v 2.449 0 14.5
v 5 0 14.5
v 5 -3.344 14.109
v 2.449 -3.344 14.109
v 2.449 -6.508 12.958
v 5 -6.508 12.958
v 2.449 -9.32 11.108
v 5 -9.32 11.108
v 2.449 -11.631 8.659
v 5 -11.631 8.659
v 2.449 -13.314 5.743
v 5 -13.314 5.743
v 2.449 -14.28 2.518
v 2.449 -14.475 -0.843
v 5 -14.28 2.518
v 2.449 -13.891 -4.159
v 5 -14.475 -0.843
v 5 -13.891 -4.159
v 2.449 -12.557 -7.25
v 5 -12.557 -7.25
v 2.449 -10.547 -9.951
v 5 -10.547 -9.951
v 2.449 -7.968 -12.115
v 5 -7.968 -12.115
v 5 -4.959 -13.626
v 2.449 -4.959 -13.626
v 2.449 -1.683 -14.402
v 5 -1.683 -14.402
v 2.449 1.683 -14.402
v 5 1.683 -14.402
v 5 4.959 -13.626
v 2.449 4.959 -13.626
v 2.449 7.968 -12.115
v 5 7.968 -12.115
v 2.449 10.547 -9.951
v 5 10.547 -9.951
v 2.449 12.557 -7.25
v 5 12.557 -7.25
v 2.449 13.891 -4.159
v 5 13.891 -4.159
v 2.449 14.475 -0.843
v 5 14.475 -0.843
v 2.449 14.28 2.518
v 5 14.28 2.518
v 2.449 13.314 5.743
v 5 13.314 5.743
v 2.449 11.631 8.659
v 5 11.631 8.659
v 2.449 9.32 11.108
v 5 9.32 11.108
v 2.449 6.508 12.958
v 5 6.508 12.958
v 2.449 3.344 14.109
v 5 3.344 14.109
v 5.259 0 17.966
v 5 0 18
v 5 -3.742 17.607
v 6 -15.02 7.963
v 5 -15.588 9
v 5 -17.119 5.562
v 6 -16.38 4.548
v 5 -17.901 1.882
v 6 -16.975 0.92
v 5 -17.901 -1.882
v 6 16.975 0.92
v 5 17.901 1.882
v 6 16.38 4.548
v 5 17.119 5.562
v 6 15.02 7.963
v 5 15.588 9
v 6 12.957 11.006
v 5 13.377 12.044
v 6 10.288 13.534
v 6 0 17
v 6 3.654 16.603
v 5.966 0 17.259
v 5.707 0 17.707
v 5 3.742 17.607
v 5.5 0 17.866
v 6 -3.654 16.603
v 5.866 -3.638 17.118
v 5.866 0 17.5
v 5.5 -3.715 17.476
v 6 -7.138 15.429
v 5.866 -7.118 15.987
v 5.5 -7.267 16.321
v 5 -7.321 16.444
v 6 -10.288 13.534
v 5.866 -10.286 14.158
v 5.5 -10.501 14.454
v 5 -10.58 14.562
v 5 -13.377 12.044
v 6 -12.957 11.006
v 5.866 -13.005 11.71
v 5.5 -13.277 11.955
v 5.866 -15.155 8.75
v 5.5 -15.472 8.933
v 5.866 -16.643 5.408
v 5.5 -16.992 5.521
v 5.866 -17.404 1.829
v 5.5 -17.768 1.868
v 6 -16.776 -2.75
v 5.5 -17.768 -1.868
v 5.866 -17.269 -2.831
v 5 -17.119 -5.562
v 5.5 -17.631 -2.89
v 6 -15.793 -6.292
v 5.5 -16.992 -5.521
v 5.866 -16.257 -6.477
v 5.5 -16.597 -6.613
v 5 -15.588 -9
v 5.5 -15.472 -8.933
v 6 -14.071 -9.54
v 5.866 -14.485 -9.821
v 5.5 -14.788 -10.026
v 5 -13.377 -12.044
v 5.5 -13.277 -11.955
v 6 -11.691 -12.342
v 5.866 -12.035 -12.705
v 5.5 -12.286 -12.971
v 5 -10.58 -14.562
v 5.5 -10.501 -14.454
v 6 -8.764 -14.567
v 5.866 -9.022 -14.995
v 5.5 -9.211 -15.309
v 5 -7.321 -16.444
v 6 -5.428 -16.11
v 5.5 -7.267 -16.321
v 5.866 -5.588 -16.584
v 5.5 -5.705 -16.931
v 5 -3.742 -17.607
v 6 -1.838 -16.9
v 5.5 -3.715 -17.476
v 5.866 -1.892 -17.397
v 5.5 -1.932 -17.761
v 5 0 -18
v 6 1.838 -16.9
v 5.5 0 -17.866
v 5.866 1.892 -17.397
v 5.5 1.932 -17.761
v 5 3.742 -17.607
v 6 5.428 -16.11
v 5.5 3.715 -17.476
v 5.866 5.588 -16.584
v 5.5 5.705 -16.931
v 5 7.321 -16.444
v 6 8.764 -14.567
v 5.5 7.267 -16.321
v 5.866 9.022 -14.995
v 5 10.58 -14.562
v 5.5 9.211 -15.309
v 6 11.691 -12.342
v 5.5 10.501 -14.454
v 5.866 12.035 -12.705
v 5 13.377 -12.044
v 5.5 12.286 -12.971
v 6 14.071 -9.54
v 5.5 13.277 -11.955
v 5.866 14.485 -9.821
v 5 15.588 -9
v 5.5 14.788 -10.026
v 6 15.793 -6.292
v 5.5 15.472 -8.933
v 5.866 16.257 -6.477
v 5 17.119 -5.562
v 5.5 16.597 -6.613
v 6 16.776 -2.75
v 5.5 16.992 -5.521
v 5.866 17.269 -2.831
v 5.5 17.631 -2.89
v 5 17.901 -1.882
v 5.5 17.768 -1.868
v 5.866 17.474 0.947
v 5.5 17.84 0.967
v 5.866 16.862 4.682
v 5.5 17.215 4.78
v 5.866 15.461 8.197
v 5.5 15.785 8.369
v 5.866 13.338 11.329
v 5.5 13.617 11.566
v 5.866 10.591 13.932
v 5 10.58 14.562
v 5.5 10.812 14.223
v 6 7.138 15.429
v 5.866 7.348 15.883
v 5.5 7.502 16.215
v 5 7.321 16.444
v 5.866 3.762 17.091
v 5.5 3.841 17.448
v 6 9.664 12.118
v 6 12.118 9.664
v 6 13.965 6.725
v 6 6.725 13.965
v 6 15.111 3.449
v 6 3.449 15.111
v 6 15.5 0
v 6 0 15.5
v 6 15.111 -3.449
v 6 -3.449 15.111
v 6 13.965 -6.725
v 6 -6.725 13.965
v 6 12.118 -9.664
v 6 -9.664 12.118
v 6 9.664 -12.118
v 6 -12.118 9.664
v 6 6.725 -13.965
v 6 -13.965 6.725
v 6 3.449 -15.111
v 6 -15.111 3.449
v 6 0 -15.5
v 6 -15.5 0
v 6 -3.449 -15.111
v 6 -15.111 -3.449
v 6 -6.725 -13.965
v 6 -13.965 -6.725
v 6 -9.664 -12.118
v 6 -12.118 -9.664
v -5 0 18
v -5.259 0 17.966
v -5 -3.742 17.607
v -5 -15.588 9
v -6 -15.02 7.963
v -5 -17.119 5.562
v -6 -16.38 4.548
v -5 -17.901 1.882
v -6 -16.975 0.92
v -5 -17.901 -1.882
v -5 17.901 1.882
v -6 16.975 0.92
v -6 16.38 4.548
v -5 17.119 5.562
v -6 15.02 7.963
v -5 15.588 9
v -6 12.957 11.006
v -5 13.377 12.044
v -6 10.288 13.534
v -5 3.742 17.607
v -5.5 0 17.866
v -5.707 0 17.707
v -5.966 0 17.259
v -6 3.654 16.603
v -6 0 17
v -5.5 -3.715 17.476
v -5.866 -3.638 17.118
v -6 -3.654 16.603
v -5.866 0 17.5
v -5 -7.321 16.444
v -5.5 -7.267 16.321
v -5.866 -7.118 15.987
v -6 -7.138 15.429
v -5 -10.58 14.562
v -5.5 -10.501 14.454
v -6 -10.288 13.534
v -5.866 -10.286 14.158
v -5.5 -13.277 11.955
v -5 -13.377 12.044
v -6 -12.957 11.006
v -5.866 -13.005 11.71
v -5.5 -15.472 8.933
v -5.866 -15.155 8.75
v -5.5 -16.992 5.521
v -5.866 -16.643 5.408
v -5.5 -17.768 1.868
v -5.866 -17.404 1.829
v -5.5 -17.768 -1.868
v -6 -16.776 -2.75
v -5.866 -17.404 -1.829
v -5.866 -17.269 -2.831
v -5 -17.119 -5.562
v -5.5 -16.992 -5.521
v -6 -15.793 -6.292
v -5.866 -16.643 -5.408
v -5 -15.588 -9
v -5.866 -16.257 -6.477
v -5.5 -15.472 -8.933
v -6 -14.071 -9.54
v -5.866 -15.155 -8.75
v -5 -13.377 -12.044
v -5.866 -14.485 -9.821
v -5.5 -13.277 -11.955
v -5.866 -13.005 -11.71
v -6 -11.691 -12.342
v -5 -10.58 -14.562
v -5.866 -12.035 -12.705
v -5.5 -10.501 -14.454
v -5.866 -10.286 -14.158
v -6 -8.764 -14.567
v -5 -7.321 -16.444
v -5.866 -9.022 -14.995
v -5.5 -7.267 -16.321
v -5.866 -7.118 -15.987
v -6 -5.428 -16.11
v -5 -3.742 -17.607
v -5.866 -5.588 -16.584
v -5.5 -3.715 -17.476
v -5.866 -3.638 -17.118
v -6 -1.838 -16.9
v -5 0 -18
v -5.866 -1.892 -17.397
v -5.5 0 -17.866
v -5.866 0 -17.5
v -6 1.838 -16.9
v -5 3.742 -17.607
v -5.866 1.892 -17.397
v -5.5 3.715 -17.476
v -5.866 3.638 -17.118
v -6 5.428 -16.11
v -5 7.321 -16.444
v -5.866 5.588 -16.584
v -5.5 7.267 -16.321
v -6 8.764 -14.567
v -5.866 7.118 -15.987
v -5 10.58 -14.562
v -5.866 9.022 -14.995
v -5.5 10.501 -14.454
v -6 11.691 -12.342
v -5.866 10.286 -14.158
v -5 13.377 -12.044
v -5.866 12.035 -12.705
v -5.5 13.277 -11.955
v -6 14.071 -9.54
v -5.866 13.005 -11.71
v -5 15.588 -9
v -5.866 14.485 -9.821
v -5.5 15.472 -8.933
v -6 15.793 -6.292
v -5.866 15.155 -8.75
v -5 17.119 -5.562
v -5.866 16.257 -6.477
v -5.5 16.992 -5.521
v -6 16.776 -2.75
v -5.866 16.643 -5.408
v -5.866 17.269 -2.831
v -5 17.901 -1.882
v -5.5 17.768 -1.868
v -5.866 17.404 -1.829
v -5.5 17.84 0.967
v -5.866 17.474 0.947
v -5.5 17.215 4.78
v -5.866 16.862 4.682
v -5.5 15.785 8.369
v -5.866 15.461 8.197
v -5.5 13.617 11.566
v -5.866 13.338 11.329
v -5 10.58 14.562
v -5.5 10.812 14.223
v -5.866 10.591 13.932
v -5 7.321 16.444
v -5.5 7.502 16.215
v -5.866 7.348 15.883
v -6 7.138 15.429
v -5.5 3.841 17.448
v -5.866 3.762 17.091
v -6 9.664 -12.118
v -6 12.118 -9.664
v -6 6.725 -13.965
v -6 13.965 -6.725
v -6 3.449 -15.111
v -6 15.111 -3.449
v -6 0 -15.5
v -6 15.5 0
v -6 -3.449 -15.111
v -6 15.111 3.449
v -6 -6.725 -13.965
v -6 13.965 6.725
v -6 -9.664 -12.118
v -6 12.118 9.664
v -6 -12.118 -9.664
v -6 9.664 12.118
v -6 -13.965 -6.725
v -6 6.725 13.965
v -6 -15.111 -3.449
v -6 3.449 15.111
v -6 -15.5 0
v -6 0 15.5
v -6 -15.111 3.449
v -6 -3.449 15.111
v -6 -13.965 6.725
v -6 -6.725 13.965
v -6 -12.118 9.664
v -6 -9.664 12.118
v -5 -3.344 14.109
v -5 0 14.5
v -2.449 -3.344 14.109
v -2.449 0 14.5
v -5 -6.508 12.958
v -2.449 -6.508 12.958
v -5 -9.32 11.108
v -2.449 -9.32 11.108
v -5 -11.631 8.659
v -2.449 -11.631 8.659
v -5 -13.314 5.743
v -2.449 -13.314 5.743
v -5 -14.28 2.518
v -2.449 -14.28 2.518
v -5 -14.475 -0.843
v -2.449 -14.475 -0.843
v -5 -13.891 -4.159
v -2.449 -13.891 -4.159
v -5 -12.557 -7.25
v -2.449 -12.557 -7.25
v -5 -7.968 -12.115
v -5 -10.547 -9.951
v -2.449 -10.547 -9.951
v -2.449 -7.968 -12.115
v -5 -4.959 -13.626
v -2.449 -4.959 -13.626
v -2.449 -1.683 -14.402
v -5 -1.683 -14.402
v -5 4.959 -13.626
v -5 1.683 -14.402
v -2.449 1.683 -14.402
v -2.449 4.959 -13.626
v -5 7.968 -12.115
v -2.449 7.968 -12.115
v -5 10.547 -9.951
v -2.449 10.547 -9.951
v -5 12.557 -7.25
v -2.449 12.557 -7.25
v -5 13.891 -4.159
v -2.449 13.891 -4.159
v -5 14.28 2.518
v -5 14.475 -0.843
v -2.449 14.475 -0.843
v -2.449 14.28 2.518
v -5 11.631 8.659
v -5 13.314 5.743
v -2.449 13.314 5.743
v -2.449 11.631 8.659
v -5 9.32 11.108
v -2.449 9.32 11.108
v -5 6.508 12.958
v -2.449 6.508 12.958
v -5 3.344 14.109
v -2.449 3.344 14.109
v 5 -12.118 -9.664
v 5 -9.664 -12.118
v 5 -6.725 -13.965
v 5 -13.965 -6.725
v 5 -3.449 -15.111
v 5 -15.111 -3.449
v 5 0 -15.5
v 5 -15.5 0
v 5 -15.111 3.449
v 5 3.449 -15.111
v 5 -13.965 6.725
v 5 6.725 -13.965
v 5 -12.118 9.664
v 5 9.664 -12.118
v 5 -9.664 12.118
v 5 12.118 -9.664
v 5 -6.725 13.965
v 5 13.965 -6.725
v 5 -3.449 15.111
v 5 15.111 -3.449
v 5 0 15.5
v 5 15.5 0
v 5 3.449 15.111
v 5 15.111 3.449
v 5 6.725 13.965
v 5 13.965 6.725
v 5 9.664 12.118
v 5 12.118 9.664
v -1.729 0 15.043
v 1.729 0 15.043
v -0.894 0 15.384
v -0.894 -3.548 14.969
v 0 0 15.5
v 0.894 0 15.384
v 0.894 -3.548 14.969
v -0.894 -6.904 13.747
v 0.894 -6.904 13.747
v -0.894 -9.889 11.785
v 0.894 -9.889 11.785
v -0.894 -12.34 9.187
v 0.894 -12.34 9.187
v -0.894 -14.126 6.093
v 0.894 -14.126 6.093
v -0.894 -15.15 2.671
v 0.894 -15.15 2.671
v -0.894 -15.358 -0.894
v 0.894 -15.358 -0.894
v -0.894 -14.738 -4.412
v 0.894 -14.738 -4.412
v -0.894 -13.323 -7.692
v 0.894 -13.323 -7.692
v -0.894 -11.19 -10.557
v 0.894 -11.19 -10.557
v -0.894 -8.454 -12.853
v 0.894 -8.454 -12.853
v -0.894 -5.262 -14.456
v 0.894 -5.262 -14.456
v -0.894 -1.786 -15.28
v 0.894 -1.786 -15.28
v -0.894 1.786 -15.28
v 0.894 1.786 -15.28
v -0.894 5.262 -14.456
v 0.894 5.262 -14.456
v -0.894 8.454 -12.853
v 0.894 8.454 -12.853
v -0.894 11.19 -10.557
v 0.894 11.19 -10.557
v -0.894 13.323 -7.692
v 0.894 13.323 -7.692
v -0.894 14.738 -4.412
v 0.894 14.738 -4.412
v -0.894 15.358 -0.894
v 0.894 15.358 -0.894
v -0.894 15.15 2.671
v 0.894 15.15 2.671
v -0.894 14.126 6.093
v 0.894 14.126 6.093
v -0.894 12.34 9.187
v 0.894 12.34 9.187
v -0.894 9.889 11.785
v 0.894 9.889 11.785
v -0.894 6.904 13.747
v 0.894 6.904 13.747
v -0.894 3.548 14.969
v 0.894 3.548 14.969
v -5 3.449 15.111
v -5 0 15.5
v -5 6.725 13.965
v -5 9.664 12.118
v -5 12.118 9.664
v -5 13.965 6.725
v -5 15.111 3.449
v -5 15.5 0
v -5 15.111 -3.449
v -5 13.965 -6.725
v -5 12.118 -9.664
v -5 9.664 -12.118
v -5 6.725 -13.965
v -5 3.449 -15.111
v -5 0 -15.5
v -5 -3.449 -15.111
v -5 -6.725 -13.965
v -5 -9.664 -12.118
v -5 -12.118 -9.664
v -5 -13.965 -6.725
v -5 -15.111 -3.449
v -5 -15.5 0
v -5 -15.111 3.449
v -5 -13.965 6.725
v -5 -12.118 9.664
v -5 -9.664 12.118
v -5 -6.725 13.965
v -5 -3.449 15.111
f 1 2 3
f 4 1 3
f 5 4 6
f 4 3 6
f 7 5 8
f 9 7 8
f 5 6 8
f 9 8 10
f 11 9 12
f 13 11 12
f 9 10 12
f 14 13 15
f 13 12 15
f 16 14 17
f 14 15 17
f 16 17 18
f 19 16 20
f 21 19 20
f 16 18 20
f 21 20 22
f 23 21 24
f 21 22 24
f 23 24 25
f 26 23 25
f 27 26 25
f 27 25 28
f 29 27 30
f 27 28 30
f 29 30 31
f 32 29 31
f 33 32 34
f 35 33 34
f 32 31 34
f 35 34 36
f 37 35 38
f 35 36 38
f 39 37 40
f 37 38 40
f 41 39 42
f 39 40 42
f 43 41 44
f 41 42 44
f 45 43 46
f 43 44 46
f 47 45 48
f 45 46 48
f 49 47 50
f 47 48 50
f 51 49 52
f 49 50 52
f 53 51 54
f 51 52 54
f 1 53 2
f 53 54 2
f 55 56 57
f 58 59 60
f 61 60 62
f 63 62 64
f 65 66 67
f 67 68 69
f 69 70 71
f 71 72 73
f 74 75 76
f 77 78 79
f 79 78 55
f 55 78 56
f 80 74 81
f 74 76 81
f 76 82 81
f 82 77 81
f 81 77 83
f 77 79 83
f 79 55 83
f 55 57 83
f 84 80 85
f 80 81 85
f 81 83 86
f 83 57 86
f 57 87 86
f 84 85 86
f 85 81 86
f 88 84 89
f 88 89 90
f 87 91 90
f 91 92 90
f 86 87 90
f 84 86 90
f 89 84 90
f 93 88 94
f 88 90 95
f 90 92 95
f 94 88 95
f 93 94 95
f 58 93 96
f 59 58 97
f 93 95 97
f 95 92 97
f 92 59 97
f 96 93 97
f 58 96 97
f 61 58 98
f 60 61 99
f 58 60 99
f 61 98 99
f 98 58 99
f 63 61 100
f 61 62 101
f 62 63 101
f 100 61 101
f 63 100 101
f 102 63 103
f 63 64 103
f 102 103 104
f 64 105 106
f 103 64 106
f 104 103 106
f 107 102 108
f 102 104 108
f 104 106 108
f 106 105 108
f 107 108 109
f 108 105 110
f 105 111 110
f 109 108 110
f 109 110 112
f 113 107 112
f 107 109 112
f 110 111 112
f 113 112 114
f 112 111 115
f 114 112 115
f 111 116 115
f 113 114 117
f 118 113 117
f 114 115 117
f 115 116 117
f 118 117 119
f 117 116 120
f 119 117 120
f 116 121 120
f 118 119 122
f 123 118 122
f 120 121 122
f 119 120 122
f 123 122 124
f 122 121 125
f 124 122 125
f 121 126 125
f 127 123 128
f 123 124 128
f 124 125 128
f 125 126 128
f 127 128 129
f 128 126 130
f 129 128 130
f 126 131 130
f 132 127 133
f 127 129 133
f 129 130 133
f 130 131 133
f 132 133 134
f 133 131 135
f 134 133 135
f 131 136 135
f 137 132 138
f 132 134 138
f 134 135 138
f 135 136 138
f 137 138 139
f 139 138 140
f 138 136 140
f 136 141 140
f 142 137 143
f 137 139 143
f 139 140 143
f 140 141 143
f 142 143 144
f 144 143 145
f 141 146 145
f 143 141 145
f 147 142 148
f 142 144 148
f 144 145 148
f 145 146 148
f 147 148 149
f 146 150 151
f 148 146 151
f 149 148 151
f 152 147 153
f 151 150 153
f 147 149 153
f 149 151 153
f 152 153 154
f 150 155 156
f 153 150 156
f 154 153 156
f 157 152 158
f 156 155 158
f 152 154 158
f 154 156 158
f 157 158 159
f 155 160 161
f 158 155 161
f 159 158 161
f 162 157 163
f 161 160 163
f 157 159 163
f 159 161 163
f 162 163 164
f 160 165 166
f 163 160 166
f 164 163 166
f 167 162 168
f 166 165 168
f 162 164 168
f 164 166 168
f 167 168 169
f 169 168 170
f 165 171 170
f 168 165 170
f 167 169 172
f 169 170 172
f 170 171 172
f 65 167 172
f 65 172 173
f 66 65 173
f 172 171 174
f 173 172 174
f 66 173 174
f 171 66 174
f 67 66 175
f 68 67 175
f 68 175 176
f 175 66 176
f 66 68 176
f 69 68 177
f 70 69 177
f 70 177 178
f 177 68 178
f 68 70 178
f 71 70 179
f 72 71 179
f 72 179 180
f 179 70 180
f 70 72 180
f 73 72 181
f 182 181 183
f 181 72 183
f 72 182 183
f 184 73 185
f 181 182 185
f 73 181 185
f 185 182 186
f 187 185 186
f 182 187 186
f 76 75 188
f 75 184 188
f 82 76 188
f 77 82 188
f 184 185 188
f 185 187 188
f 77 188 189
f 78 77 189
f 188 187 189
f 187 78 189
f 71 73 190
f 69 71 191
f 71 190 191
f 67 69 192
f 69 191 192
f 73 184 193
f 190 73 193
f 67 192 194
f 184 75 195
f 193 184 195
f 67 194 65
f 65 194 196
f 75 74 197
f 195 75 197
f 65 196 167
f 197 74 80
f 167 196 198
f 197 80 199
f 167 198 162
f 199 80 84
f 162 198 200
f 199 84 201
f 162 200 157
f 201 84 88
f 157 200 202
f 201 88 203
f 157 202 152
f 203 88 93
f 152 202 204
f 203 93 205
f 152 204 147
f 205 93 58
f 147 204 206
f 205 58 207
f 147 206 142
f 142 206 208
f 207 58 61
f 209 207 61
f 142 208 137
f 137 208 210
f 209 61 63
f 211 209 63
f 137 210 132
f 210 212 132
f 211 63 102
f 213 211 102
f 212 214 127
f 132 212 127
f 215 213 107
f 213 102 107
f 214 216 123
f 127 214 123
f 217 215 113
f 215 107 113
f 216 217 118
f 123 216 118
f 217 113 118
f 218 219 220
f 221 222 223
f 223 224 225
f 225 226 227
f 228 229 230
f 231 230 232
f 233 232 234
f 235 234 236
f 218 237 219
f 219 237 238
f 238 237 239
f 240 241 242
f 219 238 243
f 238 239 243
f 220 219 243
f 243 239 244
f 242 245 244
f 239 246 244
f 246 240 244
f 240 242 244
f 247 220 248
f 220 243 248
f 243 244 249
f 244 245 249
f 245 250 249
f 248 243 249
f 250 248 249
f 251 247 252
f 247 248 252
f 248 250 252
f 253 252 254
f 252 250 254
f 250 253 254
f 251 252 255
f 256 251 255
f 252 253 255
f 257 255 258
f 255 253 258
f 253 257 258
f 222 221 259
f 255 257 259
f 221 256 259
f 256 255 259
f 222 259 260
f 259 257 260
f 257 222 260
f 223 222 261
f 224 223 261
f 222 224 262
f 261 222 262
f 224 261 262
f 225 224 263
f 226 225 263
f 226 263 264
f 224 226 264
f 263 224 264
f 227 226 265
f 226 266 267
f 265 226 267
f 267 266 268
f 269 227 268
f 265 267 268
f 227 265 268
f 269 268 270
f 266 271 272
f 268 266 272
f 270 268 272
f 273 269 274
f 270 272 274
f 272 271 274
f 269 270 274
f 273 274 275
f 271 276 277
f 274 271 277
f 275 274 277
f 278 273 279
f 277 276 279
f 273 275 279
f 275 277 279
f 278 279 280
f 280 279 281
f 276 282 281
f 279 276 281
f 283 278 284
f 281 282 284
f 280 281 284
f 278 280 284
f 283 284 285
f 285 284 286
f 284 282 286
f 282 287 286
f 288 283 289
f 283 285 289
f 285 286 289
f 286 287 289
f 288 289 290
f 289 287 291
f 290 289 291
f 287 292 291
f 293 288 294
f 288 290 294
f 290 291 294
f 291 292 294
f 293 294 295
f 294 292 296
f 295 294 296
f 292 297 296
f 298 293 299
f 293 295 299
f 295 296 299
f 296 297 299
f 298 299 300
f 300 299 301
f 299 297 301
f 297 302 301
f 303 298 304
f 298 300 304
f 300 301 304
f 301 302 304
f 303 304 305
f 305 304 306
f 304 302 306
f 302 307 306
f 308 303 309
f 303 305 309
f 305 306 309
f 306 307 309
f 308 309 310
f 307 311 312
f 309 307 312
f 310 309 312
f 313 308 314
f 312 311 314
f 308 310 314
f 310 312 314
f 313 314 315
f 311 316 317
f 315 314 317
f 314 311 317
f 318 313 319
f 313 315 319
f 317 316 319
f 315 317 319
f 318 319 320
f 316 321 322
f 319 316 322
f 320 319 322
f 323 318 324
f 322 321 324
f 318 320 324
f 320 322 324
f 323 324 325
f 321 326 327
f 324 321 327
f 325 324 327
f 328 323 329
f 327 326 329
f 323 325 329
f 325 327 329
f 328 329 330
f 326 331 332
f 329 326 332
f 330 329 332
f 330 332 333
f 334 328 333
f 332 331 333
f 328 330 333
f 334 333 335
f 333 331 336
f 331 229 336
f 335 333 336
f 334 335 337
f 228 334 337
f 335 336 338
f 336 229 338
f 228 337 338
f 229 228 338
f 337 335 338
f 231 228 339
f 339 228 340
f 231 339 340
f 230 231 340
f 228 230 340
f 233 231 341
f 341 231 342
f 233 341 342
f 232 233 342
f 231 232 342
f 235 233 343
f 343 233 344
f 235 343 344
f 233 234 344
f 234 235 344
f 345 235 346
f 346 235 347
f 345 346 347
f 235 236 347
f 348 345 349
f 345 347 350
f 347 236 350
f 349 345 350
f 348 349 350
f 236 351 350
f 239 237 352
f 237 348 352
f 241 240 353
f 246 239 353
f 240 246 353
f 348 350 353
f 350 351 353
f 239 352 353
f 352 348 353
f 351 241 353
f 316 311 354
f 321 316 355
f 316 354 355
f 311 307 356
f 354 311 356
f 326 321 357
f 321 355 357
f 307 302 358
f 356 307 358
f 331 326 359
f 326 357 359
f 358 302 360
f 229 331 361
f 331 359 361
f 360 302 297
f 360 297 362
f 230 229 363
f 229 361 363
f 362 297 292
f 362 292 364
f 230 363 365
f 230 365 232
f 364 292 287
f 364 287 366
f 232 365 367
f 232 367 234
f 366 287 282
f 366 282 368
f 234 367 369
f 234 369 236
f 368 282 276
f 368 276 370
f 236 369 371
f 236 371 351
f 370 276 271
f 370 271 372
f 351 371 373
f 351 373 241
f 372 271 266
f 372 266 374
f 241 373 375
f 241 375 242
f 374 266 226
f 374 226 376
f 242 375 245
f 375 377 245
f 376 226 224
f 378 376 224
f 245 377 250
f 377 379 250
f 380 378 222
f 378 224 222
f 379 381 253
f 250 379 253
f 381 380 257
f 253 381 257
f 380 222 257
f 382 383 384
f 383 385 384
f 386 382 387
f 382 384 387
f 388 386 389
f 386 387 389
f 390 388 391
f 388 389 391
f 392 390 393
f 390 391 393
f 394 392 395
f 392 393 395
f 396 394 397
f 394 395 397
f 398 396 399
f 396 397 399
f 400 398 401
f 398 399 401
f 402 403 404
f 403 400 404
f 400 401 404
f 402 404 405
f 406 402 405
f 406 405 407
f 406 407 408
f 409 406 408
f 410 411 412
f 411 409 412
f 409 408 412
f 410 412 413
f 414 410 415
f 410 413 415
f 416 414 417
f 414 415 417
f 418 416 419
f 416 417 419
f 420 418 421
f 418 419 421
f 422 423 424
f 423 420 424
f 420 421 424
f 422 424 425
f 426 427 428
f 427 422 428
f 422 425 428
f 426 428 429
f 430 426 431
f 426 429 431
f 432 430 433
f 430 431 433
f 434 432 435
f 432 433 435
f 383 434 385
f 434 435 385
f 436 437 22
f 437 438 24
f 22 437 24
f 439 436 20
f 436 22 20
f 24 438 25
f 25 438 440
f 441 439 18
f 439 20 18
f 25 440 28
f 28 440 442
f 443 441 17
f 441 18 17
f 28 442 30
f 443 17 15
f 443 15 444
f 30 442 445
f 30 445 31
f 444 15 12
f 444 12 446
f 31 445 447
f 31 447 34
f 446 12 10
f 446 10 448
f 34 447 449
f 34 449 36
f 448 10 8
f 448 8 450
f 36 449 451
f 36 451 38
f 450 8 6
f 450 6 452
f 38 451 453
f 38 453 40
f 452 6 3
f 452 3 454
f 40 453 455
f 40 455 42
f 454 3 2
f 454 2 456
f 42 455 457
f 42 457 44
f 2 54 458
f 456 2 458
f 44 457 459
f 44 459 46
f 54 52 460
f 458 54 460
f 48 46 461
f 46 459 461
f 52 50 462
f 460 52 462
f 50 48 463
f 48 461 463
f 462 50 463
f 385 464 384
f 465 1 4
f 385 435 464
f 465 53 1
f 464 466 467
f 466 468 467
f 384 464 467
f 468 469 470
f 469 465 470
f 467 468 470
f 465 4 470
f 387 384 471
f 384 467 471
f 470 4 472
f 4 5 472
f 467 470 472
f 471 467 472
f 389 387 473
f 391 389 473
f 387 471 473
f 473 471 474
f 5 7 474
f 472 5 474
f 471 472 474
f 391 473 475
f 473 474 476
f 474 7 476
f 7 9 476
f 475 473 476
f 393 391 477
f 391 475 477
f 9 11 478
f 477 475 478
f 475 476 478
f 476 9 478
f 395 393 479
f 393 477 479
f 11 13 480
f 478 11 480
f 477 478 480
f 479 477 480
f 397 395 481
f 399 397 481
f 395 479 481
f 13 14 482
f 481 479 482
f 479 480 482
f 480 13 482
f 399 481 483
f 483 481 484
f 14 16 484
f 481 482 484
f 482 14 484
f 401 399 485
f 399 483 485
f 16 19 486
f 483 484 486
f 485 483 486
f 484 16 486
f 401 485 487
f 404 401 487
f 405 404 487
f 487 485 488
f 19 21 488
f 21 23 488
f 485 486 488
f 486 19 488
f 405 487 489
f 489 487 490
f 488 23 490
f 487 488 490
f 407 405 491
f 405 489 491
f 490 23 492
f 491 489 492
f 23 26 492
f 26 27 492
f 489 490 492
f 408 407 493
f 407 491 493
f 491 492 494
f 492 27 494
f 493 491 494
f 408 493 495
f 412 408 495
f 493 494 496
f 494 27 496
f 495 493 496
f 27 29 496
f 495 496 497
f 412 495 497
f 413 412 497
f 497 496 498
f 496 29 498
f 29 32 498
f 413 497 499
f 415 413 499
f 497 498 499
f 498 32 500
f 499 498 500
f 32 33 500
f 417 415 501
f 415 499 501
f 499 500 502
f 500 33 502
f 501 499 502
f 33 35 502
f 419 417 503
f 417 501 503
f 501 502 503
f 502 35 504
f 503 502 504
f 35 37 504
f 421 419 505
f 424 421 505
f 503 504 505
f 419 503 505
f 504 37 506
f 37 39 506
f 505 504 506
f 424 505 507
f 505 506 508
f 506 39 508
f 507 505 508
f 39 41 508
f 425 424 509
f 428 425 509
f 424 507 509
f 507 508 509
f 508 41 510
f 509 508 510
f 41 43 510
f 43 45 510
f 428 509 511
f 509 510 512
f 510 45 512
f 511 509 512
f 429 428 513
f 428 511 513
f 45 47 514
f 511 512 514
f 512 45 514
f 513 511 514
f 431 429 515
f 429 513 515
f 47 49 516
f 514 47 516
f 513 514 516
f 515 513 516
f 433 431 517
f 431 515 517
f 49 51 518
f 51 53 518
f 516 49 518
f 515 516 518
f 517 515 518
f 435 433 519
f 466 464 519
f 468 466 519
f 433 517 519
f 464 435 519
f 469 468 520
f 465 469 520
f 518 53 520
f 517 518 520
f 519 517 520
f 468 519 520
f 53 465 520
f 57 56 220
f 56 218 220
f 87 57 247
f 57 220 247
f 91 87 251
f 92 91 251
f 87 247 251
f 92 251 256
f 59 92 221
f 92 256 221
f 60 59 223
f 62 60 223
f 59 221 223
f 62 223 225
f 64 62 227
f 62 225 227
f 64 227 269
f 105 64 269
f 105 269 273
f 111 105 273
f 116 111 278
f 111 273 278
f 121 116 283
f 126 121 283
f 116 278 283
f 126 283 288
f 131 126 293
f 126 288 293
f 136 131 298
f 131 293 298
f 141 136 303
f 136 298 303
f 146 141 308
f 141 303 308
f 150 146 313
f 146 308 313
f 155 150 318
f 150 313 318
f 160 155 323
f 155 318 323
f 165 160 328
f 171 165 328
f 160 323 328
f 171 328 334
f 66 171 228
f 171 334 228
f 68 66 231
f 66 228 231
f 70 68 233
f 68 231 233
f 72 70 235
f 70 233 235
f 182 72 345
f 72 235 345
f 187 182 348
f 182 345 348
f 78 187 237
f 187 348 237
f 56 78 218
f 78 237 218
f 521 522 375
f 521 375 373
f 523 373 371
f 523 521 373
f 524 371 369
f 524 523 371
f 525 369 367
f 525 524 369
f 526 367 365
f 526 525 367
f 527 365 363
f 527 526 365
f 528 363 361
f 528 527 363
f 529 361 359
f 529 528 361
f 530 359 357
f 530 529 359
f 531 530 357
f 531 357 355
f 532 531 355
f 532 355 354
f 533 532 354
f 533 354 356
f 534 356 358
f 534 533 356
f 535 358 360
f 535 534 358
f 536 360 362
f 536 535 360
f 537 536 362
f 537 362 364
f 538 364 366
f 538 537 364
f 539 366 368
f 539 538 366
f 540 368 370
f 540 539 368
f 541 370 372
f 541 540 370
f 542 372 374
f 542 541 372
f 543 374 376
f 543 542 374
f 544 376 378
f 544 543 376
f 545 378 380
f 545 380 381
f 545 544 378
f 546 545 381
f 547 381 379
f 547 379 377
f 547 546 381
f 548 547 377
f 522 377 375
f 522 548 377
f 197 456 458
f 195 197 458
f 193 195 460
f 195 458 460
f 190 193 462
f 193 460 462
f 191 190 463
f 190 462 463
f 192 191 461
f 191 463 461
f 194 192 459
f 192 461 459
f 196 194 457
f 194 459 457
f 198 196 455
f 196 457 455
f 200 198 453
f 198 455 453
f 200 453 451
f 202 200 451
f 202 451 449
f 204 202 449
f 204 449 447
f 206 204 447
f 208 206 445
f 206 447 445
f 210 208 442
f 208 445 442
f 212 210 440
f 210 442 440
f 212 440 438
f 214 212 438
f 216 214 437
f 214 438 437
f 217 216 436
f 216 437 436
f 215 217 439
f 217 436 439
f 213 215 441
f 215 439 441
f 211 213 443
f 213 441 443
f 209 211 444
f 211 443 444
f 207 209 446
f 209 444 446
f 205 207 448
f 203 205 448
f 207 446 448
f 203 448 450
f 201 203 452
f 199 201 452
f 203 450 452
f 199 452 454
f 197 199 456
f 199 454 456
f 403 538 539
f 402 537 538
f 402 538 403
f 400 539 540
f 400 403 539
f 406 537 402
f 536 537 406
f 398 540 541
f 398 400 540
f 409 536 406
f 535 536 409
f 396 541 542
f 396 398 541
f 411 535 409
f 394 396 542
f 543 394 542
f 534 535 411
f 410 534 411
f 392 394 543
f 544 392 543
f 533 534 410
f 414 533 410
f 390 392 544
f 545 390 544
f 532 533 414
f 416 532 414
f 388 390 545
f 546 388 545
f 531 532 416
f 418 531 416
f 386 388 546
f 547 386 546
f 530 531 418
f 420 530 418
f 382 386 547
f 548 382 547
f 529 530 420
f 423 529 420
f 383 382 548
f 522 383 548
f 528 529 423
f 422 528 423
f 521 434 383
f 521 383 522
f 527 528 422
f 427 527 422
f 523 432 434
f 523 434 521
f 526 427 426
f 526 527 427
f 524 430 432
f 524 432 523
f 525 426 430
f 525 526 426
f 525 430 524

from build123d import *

# Parameters (mm, degrees)
CUT_EXTRUDE1_START = -1
SKETCH3_R          = 15.5
SKETCH3_R_2        = 14.5
CUT_EXTRUDE1_DEPTH = 1


with BuildPart() as part:
    # Sketch2 → Revolve1 (revolve)
    with BuildSketch(Plane.XY, mode=Mode.PRIVATE) as revolve1_sk:
        with BuildLine():
            Line((-6, 14.5), (-2.449489743, 14.5))
            ThreePointArc((-2.449489743, 14.5), (0, 15.5), (2.449489743, 14.5))
            Line((2.449489743, 14.5), (6, 14.5))
            Line((6, 14.5), (6, 17))
            ThreePointArc((6, 17), (5.707106781, 17.707106781), (5, 18))
            Line((5, 18), (-5, 18))
            ThreePointArc((-5, 18), (-5.707106781, 17.707106781), (-6, 17))
            Line((-6, 17), (-6, 14.5))
        make_face()
    revolve(revolve1_sk.sketch.rotate(Axis((-6, 0, 0), (1, 0, 0)), 90), axis=Axis((-6, 0, 0), (1, 0, 0)))

    # Sketch3 → Cut-Extrude1 (cut)
    with BuildSketch(Plane.ZY.offset(6).offset(CUT_EXTRUDE1_START)):
        Circle(SKETCH3_R)
        Circle(SKETCH3_R_2, mode=Mode.SUBTRACT)
    cut_extrude1 = extrude(amount=CUT_EXTRUDE1_DEPTH, mode=Mode.SUBTRACT)

    # Mirror1: Cut-Extrude1 across plane
    add(cut_extrude1.mirror(Plane(origin=(0, 0, 0), x_dir=(0, 0, 1), z_dir=(1, 0, 0))), mode=Mode.SUBTRACT)


solid = part.part
